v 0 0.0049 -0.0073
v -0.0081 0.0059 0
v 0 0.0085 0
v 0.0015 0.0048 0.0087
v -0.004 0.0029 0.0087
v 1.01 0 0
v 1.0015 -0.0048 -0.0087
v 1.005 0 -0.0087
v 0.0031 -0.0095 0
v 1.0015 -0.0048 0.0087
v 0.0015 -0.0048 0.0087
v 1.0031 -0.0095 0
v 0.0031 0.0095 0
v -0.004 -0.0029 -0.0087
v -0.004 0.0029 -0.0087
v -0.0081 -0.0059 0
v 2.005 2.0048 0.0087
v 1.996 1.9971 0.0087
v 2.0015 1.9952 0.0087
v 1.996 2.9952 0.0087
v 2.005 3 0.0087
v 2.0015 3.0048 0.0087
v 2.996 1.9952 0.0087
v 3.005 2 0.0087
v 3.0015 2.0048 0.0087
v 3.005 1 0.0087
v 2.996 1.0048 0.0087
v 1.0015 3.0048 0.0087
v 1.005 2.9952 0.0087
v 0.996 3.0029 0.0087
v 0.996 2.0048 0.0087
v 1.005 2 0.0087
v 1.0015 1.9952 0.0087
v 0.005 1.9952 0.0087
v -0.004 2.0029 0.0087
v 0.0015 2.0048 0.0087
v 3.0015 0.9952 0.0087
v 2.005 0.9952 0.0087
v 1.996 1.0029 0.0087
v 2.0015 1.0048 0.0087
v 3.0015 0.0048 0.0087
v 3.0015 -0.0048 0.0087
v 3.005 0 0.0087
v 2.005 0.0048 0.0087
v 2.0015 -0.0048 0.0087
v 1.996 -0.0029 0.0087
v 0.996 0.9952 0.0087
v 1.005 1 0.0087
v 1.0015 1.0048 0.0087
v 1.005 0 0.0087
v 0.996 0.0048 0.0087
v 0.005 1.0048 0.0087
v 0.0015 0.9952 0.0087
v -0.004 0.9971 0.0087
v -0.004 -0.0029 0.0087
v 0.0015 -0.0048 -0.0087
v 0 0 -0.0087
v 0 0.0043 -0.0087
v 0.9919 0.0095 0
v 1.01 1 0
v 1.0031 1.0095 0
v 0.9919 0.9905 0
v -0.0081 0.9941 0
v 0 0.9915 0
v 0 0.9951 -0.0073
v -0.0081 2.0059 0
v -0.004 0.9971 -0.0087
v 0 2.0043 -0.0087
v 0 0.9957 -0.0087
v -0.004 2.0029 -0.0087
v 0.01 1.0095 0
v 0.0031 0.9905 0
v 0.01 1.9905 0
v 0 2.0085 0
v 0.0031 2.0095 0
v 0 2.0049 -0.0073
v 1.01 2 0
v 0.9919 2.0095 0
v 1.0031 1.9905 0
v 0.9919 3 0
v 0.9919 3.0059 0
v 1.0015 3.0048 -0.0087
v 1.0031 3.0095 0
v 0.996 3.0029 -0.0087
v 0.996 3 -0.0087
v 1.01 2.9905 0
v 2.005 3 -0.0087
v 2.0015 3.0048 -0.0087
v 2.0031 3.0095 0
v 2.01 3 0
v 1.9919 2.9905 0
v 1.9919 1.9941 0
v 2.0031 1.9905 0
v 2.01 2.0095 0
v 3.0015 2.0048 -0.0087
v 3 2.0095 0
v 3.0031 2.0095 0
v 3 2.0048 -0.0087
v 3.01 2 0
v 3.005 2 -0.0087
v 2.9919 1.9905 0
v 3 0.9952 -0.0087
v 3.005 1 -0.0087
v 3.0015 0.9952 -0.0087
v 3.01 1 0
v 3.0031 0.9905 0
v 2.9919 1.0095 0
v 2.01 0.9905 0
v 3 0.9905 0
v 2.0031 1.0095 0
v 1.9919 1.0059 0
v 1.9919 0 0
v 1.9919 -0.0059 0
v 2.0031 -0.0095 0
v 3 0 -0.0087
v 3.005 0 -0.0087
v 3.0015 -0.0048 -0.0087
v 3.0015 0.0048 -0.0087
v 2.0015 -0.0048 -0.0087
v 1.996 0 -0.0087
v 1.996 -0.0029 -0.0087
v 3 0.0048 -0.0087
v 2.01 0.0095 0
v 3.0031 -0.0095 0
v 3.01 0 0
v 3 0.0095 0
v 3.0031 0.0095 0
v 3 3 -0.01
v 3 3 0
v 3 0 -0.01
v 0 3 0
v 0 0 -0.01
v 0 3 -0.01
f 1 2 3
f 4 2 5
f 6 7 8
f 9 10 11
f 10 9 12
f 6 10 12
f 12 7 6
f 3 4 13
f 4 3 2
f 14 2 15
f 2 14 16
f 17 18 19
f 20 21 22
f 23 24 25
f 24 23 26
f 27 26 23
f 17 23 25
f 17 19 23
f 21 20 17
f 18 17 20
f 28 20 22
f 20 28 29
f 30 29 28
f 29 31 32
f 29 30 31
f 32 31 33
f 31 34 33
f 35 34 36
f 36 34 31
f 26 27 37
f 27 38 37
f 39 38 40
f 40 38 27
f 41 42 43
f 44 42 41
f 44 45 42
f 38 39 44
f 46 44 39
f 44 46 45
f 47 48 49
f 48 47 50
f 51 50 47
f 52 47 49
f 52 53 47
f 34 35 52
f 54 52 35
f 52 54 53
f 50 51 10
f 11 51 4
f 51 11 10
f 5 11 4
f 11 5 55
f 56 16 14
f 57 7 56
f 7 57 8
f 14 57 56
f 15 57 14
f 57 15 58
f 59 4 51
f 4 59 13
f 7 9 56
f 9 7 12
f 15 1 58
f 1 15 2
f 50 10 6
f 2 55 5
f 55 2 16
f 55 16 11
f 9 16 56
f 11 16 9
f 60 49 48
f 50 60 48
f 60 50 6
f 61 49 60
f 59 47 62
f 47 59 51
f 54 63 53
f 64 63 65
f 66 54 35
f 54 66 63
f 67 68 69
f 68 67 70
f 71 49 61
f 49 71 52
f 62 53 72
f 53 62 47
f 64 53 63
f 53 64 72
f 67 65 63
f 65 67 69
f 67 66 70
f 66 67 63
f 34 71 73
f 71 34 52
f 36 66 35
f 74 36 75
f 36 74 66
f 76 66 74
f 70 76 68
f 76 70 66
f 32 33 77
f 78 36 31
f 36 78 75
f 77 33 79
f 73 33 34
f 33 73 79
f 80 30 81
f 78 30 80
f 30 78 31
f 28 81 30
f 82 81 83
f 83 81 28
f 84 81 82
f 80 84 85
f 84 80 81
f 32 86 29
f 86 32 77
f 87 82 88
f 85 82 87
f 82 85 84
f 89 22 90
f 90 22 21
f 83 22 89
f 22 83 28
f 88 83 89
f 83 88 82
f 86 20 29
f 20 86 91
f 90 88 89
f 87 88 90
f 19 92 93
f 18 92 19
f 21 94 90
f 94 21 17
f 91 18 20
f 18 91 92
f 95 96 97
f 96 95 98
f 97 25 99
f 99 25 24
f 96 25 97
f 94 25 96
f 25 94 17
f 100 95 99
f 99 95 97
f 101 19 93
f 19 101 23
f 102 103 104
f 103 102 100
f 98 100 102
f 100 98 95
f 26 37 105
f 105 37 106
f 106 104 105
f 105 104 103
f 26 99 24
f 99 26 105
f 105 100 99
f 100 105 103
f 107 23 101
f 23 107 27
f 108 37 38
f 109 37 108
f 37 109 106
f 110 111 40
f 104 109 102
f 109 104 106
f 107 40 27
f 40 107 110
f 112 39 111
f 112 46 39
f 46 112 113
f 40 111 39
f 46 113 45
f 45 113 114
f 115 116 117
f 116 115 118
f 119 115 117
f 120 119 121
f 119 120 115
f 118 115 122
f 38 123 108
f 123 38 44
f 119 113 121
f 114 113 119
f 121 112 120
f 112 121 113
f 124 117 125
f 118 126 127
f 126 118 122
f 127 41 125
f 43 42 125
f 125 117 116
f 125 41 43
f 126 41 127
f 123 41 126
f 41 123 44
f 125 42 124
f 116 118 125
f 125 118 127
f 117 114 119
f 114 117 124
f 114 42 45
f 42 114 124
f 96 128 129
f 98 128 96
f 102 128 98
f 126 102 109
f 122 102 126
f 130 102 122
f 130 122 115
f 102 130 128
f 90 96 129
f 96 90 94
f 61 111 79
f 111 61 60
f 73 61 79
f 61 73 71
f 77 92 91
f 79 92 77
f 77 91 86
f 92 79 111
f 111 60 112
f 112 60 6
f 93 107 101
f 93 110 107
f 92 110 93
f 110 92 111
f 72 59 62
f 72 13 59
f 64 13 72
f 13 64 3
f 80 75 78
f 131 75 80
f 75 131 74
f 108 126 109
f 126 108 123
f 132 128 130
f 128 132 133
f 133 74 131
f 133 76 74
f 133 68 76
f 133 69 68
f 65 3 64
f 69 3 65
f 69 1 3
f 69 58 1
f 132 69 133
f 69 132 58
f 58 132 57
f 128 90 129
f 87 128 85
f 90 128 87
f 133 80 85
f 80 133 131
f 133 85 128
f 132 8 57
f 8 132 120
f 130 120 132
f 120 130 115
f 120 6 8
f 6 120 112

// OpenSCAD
hull(){
    translate([0, 0]) sphere(0.01);
    translate([1, 0]) sphere(0.01);
}
hull(){
    translate([1, 0]) sphere(0.01);
    translate([1, 1]) sphere(0.01);
}
hull(){
    translate([1, 1]) sphere(0.01);
    translate([0, 1]) sphere(0.01);
}
hull(){
    translate([0, 1]) sphere(0.01);
    translate([0, 2]) sphere(0.01);
}
hull(){
    translate([0, 2]) sphere(0.01);
    translate([1, 2]) sphere(0.01);
}
hull(){
    translate([1, 2]) sphere(0.01);
    translate([1, 3]) sphere(0.01);
}
hull(){
    translate([1, 3]) sphere(0.01);
    translate([2, 3]) sphere(0.01);
}
hull(){
    translate([2, 3]) sphere(0.01);
    translate([2, 2]) sphere(0.01);
}
hull(){
    translate([2, 2]) sphere(0.01);
    translate([3, 2]) sphere(0.01);
}
hull(){
    translate([3, 2]) sphere(0.01);
    translate([3, 1]) sphere(0.01);
}
hull(){
    translate([3, 1]) sphere(0.01);
    translate([2, 1]) sphere(0.01);
}
hull(){
    translate([2, 1]) sphere(0.01);
    translate([2, 0]) sphere(0.01);
}
hull(){
    translate([2, 0]) sphere(0.01);
    translate([3, 0]) sphere(0.01);
}
translate([0,0,-0.01]) color([0.1,0.1,0.1]) cube([3,3,0.01]);
